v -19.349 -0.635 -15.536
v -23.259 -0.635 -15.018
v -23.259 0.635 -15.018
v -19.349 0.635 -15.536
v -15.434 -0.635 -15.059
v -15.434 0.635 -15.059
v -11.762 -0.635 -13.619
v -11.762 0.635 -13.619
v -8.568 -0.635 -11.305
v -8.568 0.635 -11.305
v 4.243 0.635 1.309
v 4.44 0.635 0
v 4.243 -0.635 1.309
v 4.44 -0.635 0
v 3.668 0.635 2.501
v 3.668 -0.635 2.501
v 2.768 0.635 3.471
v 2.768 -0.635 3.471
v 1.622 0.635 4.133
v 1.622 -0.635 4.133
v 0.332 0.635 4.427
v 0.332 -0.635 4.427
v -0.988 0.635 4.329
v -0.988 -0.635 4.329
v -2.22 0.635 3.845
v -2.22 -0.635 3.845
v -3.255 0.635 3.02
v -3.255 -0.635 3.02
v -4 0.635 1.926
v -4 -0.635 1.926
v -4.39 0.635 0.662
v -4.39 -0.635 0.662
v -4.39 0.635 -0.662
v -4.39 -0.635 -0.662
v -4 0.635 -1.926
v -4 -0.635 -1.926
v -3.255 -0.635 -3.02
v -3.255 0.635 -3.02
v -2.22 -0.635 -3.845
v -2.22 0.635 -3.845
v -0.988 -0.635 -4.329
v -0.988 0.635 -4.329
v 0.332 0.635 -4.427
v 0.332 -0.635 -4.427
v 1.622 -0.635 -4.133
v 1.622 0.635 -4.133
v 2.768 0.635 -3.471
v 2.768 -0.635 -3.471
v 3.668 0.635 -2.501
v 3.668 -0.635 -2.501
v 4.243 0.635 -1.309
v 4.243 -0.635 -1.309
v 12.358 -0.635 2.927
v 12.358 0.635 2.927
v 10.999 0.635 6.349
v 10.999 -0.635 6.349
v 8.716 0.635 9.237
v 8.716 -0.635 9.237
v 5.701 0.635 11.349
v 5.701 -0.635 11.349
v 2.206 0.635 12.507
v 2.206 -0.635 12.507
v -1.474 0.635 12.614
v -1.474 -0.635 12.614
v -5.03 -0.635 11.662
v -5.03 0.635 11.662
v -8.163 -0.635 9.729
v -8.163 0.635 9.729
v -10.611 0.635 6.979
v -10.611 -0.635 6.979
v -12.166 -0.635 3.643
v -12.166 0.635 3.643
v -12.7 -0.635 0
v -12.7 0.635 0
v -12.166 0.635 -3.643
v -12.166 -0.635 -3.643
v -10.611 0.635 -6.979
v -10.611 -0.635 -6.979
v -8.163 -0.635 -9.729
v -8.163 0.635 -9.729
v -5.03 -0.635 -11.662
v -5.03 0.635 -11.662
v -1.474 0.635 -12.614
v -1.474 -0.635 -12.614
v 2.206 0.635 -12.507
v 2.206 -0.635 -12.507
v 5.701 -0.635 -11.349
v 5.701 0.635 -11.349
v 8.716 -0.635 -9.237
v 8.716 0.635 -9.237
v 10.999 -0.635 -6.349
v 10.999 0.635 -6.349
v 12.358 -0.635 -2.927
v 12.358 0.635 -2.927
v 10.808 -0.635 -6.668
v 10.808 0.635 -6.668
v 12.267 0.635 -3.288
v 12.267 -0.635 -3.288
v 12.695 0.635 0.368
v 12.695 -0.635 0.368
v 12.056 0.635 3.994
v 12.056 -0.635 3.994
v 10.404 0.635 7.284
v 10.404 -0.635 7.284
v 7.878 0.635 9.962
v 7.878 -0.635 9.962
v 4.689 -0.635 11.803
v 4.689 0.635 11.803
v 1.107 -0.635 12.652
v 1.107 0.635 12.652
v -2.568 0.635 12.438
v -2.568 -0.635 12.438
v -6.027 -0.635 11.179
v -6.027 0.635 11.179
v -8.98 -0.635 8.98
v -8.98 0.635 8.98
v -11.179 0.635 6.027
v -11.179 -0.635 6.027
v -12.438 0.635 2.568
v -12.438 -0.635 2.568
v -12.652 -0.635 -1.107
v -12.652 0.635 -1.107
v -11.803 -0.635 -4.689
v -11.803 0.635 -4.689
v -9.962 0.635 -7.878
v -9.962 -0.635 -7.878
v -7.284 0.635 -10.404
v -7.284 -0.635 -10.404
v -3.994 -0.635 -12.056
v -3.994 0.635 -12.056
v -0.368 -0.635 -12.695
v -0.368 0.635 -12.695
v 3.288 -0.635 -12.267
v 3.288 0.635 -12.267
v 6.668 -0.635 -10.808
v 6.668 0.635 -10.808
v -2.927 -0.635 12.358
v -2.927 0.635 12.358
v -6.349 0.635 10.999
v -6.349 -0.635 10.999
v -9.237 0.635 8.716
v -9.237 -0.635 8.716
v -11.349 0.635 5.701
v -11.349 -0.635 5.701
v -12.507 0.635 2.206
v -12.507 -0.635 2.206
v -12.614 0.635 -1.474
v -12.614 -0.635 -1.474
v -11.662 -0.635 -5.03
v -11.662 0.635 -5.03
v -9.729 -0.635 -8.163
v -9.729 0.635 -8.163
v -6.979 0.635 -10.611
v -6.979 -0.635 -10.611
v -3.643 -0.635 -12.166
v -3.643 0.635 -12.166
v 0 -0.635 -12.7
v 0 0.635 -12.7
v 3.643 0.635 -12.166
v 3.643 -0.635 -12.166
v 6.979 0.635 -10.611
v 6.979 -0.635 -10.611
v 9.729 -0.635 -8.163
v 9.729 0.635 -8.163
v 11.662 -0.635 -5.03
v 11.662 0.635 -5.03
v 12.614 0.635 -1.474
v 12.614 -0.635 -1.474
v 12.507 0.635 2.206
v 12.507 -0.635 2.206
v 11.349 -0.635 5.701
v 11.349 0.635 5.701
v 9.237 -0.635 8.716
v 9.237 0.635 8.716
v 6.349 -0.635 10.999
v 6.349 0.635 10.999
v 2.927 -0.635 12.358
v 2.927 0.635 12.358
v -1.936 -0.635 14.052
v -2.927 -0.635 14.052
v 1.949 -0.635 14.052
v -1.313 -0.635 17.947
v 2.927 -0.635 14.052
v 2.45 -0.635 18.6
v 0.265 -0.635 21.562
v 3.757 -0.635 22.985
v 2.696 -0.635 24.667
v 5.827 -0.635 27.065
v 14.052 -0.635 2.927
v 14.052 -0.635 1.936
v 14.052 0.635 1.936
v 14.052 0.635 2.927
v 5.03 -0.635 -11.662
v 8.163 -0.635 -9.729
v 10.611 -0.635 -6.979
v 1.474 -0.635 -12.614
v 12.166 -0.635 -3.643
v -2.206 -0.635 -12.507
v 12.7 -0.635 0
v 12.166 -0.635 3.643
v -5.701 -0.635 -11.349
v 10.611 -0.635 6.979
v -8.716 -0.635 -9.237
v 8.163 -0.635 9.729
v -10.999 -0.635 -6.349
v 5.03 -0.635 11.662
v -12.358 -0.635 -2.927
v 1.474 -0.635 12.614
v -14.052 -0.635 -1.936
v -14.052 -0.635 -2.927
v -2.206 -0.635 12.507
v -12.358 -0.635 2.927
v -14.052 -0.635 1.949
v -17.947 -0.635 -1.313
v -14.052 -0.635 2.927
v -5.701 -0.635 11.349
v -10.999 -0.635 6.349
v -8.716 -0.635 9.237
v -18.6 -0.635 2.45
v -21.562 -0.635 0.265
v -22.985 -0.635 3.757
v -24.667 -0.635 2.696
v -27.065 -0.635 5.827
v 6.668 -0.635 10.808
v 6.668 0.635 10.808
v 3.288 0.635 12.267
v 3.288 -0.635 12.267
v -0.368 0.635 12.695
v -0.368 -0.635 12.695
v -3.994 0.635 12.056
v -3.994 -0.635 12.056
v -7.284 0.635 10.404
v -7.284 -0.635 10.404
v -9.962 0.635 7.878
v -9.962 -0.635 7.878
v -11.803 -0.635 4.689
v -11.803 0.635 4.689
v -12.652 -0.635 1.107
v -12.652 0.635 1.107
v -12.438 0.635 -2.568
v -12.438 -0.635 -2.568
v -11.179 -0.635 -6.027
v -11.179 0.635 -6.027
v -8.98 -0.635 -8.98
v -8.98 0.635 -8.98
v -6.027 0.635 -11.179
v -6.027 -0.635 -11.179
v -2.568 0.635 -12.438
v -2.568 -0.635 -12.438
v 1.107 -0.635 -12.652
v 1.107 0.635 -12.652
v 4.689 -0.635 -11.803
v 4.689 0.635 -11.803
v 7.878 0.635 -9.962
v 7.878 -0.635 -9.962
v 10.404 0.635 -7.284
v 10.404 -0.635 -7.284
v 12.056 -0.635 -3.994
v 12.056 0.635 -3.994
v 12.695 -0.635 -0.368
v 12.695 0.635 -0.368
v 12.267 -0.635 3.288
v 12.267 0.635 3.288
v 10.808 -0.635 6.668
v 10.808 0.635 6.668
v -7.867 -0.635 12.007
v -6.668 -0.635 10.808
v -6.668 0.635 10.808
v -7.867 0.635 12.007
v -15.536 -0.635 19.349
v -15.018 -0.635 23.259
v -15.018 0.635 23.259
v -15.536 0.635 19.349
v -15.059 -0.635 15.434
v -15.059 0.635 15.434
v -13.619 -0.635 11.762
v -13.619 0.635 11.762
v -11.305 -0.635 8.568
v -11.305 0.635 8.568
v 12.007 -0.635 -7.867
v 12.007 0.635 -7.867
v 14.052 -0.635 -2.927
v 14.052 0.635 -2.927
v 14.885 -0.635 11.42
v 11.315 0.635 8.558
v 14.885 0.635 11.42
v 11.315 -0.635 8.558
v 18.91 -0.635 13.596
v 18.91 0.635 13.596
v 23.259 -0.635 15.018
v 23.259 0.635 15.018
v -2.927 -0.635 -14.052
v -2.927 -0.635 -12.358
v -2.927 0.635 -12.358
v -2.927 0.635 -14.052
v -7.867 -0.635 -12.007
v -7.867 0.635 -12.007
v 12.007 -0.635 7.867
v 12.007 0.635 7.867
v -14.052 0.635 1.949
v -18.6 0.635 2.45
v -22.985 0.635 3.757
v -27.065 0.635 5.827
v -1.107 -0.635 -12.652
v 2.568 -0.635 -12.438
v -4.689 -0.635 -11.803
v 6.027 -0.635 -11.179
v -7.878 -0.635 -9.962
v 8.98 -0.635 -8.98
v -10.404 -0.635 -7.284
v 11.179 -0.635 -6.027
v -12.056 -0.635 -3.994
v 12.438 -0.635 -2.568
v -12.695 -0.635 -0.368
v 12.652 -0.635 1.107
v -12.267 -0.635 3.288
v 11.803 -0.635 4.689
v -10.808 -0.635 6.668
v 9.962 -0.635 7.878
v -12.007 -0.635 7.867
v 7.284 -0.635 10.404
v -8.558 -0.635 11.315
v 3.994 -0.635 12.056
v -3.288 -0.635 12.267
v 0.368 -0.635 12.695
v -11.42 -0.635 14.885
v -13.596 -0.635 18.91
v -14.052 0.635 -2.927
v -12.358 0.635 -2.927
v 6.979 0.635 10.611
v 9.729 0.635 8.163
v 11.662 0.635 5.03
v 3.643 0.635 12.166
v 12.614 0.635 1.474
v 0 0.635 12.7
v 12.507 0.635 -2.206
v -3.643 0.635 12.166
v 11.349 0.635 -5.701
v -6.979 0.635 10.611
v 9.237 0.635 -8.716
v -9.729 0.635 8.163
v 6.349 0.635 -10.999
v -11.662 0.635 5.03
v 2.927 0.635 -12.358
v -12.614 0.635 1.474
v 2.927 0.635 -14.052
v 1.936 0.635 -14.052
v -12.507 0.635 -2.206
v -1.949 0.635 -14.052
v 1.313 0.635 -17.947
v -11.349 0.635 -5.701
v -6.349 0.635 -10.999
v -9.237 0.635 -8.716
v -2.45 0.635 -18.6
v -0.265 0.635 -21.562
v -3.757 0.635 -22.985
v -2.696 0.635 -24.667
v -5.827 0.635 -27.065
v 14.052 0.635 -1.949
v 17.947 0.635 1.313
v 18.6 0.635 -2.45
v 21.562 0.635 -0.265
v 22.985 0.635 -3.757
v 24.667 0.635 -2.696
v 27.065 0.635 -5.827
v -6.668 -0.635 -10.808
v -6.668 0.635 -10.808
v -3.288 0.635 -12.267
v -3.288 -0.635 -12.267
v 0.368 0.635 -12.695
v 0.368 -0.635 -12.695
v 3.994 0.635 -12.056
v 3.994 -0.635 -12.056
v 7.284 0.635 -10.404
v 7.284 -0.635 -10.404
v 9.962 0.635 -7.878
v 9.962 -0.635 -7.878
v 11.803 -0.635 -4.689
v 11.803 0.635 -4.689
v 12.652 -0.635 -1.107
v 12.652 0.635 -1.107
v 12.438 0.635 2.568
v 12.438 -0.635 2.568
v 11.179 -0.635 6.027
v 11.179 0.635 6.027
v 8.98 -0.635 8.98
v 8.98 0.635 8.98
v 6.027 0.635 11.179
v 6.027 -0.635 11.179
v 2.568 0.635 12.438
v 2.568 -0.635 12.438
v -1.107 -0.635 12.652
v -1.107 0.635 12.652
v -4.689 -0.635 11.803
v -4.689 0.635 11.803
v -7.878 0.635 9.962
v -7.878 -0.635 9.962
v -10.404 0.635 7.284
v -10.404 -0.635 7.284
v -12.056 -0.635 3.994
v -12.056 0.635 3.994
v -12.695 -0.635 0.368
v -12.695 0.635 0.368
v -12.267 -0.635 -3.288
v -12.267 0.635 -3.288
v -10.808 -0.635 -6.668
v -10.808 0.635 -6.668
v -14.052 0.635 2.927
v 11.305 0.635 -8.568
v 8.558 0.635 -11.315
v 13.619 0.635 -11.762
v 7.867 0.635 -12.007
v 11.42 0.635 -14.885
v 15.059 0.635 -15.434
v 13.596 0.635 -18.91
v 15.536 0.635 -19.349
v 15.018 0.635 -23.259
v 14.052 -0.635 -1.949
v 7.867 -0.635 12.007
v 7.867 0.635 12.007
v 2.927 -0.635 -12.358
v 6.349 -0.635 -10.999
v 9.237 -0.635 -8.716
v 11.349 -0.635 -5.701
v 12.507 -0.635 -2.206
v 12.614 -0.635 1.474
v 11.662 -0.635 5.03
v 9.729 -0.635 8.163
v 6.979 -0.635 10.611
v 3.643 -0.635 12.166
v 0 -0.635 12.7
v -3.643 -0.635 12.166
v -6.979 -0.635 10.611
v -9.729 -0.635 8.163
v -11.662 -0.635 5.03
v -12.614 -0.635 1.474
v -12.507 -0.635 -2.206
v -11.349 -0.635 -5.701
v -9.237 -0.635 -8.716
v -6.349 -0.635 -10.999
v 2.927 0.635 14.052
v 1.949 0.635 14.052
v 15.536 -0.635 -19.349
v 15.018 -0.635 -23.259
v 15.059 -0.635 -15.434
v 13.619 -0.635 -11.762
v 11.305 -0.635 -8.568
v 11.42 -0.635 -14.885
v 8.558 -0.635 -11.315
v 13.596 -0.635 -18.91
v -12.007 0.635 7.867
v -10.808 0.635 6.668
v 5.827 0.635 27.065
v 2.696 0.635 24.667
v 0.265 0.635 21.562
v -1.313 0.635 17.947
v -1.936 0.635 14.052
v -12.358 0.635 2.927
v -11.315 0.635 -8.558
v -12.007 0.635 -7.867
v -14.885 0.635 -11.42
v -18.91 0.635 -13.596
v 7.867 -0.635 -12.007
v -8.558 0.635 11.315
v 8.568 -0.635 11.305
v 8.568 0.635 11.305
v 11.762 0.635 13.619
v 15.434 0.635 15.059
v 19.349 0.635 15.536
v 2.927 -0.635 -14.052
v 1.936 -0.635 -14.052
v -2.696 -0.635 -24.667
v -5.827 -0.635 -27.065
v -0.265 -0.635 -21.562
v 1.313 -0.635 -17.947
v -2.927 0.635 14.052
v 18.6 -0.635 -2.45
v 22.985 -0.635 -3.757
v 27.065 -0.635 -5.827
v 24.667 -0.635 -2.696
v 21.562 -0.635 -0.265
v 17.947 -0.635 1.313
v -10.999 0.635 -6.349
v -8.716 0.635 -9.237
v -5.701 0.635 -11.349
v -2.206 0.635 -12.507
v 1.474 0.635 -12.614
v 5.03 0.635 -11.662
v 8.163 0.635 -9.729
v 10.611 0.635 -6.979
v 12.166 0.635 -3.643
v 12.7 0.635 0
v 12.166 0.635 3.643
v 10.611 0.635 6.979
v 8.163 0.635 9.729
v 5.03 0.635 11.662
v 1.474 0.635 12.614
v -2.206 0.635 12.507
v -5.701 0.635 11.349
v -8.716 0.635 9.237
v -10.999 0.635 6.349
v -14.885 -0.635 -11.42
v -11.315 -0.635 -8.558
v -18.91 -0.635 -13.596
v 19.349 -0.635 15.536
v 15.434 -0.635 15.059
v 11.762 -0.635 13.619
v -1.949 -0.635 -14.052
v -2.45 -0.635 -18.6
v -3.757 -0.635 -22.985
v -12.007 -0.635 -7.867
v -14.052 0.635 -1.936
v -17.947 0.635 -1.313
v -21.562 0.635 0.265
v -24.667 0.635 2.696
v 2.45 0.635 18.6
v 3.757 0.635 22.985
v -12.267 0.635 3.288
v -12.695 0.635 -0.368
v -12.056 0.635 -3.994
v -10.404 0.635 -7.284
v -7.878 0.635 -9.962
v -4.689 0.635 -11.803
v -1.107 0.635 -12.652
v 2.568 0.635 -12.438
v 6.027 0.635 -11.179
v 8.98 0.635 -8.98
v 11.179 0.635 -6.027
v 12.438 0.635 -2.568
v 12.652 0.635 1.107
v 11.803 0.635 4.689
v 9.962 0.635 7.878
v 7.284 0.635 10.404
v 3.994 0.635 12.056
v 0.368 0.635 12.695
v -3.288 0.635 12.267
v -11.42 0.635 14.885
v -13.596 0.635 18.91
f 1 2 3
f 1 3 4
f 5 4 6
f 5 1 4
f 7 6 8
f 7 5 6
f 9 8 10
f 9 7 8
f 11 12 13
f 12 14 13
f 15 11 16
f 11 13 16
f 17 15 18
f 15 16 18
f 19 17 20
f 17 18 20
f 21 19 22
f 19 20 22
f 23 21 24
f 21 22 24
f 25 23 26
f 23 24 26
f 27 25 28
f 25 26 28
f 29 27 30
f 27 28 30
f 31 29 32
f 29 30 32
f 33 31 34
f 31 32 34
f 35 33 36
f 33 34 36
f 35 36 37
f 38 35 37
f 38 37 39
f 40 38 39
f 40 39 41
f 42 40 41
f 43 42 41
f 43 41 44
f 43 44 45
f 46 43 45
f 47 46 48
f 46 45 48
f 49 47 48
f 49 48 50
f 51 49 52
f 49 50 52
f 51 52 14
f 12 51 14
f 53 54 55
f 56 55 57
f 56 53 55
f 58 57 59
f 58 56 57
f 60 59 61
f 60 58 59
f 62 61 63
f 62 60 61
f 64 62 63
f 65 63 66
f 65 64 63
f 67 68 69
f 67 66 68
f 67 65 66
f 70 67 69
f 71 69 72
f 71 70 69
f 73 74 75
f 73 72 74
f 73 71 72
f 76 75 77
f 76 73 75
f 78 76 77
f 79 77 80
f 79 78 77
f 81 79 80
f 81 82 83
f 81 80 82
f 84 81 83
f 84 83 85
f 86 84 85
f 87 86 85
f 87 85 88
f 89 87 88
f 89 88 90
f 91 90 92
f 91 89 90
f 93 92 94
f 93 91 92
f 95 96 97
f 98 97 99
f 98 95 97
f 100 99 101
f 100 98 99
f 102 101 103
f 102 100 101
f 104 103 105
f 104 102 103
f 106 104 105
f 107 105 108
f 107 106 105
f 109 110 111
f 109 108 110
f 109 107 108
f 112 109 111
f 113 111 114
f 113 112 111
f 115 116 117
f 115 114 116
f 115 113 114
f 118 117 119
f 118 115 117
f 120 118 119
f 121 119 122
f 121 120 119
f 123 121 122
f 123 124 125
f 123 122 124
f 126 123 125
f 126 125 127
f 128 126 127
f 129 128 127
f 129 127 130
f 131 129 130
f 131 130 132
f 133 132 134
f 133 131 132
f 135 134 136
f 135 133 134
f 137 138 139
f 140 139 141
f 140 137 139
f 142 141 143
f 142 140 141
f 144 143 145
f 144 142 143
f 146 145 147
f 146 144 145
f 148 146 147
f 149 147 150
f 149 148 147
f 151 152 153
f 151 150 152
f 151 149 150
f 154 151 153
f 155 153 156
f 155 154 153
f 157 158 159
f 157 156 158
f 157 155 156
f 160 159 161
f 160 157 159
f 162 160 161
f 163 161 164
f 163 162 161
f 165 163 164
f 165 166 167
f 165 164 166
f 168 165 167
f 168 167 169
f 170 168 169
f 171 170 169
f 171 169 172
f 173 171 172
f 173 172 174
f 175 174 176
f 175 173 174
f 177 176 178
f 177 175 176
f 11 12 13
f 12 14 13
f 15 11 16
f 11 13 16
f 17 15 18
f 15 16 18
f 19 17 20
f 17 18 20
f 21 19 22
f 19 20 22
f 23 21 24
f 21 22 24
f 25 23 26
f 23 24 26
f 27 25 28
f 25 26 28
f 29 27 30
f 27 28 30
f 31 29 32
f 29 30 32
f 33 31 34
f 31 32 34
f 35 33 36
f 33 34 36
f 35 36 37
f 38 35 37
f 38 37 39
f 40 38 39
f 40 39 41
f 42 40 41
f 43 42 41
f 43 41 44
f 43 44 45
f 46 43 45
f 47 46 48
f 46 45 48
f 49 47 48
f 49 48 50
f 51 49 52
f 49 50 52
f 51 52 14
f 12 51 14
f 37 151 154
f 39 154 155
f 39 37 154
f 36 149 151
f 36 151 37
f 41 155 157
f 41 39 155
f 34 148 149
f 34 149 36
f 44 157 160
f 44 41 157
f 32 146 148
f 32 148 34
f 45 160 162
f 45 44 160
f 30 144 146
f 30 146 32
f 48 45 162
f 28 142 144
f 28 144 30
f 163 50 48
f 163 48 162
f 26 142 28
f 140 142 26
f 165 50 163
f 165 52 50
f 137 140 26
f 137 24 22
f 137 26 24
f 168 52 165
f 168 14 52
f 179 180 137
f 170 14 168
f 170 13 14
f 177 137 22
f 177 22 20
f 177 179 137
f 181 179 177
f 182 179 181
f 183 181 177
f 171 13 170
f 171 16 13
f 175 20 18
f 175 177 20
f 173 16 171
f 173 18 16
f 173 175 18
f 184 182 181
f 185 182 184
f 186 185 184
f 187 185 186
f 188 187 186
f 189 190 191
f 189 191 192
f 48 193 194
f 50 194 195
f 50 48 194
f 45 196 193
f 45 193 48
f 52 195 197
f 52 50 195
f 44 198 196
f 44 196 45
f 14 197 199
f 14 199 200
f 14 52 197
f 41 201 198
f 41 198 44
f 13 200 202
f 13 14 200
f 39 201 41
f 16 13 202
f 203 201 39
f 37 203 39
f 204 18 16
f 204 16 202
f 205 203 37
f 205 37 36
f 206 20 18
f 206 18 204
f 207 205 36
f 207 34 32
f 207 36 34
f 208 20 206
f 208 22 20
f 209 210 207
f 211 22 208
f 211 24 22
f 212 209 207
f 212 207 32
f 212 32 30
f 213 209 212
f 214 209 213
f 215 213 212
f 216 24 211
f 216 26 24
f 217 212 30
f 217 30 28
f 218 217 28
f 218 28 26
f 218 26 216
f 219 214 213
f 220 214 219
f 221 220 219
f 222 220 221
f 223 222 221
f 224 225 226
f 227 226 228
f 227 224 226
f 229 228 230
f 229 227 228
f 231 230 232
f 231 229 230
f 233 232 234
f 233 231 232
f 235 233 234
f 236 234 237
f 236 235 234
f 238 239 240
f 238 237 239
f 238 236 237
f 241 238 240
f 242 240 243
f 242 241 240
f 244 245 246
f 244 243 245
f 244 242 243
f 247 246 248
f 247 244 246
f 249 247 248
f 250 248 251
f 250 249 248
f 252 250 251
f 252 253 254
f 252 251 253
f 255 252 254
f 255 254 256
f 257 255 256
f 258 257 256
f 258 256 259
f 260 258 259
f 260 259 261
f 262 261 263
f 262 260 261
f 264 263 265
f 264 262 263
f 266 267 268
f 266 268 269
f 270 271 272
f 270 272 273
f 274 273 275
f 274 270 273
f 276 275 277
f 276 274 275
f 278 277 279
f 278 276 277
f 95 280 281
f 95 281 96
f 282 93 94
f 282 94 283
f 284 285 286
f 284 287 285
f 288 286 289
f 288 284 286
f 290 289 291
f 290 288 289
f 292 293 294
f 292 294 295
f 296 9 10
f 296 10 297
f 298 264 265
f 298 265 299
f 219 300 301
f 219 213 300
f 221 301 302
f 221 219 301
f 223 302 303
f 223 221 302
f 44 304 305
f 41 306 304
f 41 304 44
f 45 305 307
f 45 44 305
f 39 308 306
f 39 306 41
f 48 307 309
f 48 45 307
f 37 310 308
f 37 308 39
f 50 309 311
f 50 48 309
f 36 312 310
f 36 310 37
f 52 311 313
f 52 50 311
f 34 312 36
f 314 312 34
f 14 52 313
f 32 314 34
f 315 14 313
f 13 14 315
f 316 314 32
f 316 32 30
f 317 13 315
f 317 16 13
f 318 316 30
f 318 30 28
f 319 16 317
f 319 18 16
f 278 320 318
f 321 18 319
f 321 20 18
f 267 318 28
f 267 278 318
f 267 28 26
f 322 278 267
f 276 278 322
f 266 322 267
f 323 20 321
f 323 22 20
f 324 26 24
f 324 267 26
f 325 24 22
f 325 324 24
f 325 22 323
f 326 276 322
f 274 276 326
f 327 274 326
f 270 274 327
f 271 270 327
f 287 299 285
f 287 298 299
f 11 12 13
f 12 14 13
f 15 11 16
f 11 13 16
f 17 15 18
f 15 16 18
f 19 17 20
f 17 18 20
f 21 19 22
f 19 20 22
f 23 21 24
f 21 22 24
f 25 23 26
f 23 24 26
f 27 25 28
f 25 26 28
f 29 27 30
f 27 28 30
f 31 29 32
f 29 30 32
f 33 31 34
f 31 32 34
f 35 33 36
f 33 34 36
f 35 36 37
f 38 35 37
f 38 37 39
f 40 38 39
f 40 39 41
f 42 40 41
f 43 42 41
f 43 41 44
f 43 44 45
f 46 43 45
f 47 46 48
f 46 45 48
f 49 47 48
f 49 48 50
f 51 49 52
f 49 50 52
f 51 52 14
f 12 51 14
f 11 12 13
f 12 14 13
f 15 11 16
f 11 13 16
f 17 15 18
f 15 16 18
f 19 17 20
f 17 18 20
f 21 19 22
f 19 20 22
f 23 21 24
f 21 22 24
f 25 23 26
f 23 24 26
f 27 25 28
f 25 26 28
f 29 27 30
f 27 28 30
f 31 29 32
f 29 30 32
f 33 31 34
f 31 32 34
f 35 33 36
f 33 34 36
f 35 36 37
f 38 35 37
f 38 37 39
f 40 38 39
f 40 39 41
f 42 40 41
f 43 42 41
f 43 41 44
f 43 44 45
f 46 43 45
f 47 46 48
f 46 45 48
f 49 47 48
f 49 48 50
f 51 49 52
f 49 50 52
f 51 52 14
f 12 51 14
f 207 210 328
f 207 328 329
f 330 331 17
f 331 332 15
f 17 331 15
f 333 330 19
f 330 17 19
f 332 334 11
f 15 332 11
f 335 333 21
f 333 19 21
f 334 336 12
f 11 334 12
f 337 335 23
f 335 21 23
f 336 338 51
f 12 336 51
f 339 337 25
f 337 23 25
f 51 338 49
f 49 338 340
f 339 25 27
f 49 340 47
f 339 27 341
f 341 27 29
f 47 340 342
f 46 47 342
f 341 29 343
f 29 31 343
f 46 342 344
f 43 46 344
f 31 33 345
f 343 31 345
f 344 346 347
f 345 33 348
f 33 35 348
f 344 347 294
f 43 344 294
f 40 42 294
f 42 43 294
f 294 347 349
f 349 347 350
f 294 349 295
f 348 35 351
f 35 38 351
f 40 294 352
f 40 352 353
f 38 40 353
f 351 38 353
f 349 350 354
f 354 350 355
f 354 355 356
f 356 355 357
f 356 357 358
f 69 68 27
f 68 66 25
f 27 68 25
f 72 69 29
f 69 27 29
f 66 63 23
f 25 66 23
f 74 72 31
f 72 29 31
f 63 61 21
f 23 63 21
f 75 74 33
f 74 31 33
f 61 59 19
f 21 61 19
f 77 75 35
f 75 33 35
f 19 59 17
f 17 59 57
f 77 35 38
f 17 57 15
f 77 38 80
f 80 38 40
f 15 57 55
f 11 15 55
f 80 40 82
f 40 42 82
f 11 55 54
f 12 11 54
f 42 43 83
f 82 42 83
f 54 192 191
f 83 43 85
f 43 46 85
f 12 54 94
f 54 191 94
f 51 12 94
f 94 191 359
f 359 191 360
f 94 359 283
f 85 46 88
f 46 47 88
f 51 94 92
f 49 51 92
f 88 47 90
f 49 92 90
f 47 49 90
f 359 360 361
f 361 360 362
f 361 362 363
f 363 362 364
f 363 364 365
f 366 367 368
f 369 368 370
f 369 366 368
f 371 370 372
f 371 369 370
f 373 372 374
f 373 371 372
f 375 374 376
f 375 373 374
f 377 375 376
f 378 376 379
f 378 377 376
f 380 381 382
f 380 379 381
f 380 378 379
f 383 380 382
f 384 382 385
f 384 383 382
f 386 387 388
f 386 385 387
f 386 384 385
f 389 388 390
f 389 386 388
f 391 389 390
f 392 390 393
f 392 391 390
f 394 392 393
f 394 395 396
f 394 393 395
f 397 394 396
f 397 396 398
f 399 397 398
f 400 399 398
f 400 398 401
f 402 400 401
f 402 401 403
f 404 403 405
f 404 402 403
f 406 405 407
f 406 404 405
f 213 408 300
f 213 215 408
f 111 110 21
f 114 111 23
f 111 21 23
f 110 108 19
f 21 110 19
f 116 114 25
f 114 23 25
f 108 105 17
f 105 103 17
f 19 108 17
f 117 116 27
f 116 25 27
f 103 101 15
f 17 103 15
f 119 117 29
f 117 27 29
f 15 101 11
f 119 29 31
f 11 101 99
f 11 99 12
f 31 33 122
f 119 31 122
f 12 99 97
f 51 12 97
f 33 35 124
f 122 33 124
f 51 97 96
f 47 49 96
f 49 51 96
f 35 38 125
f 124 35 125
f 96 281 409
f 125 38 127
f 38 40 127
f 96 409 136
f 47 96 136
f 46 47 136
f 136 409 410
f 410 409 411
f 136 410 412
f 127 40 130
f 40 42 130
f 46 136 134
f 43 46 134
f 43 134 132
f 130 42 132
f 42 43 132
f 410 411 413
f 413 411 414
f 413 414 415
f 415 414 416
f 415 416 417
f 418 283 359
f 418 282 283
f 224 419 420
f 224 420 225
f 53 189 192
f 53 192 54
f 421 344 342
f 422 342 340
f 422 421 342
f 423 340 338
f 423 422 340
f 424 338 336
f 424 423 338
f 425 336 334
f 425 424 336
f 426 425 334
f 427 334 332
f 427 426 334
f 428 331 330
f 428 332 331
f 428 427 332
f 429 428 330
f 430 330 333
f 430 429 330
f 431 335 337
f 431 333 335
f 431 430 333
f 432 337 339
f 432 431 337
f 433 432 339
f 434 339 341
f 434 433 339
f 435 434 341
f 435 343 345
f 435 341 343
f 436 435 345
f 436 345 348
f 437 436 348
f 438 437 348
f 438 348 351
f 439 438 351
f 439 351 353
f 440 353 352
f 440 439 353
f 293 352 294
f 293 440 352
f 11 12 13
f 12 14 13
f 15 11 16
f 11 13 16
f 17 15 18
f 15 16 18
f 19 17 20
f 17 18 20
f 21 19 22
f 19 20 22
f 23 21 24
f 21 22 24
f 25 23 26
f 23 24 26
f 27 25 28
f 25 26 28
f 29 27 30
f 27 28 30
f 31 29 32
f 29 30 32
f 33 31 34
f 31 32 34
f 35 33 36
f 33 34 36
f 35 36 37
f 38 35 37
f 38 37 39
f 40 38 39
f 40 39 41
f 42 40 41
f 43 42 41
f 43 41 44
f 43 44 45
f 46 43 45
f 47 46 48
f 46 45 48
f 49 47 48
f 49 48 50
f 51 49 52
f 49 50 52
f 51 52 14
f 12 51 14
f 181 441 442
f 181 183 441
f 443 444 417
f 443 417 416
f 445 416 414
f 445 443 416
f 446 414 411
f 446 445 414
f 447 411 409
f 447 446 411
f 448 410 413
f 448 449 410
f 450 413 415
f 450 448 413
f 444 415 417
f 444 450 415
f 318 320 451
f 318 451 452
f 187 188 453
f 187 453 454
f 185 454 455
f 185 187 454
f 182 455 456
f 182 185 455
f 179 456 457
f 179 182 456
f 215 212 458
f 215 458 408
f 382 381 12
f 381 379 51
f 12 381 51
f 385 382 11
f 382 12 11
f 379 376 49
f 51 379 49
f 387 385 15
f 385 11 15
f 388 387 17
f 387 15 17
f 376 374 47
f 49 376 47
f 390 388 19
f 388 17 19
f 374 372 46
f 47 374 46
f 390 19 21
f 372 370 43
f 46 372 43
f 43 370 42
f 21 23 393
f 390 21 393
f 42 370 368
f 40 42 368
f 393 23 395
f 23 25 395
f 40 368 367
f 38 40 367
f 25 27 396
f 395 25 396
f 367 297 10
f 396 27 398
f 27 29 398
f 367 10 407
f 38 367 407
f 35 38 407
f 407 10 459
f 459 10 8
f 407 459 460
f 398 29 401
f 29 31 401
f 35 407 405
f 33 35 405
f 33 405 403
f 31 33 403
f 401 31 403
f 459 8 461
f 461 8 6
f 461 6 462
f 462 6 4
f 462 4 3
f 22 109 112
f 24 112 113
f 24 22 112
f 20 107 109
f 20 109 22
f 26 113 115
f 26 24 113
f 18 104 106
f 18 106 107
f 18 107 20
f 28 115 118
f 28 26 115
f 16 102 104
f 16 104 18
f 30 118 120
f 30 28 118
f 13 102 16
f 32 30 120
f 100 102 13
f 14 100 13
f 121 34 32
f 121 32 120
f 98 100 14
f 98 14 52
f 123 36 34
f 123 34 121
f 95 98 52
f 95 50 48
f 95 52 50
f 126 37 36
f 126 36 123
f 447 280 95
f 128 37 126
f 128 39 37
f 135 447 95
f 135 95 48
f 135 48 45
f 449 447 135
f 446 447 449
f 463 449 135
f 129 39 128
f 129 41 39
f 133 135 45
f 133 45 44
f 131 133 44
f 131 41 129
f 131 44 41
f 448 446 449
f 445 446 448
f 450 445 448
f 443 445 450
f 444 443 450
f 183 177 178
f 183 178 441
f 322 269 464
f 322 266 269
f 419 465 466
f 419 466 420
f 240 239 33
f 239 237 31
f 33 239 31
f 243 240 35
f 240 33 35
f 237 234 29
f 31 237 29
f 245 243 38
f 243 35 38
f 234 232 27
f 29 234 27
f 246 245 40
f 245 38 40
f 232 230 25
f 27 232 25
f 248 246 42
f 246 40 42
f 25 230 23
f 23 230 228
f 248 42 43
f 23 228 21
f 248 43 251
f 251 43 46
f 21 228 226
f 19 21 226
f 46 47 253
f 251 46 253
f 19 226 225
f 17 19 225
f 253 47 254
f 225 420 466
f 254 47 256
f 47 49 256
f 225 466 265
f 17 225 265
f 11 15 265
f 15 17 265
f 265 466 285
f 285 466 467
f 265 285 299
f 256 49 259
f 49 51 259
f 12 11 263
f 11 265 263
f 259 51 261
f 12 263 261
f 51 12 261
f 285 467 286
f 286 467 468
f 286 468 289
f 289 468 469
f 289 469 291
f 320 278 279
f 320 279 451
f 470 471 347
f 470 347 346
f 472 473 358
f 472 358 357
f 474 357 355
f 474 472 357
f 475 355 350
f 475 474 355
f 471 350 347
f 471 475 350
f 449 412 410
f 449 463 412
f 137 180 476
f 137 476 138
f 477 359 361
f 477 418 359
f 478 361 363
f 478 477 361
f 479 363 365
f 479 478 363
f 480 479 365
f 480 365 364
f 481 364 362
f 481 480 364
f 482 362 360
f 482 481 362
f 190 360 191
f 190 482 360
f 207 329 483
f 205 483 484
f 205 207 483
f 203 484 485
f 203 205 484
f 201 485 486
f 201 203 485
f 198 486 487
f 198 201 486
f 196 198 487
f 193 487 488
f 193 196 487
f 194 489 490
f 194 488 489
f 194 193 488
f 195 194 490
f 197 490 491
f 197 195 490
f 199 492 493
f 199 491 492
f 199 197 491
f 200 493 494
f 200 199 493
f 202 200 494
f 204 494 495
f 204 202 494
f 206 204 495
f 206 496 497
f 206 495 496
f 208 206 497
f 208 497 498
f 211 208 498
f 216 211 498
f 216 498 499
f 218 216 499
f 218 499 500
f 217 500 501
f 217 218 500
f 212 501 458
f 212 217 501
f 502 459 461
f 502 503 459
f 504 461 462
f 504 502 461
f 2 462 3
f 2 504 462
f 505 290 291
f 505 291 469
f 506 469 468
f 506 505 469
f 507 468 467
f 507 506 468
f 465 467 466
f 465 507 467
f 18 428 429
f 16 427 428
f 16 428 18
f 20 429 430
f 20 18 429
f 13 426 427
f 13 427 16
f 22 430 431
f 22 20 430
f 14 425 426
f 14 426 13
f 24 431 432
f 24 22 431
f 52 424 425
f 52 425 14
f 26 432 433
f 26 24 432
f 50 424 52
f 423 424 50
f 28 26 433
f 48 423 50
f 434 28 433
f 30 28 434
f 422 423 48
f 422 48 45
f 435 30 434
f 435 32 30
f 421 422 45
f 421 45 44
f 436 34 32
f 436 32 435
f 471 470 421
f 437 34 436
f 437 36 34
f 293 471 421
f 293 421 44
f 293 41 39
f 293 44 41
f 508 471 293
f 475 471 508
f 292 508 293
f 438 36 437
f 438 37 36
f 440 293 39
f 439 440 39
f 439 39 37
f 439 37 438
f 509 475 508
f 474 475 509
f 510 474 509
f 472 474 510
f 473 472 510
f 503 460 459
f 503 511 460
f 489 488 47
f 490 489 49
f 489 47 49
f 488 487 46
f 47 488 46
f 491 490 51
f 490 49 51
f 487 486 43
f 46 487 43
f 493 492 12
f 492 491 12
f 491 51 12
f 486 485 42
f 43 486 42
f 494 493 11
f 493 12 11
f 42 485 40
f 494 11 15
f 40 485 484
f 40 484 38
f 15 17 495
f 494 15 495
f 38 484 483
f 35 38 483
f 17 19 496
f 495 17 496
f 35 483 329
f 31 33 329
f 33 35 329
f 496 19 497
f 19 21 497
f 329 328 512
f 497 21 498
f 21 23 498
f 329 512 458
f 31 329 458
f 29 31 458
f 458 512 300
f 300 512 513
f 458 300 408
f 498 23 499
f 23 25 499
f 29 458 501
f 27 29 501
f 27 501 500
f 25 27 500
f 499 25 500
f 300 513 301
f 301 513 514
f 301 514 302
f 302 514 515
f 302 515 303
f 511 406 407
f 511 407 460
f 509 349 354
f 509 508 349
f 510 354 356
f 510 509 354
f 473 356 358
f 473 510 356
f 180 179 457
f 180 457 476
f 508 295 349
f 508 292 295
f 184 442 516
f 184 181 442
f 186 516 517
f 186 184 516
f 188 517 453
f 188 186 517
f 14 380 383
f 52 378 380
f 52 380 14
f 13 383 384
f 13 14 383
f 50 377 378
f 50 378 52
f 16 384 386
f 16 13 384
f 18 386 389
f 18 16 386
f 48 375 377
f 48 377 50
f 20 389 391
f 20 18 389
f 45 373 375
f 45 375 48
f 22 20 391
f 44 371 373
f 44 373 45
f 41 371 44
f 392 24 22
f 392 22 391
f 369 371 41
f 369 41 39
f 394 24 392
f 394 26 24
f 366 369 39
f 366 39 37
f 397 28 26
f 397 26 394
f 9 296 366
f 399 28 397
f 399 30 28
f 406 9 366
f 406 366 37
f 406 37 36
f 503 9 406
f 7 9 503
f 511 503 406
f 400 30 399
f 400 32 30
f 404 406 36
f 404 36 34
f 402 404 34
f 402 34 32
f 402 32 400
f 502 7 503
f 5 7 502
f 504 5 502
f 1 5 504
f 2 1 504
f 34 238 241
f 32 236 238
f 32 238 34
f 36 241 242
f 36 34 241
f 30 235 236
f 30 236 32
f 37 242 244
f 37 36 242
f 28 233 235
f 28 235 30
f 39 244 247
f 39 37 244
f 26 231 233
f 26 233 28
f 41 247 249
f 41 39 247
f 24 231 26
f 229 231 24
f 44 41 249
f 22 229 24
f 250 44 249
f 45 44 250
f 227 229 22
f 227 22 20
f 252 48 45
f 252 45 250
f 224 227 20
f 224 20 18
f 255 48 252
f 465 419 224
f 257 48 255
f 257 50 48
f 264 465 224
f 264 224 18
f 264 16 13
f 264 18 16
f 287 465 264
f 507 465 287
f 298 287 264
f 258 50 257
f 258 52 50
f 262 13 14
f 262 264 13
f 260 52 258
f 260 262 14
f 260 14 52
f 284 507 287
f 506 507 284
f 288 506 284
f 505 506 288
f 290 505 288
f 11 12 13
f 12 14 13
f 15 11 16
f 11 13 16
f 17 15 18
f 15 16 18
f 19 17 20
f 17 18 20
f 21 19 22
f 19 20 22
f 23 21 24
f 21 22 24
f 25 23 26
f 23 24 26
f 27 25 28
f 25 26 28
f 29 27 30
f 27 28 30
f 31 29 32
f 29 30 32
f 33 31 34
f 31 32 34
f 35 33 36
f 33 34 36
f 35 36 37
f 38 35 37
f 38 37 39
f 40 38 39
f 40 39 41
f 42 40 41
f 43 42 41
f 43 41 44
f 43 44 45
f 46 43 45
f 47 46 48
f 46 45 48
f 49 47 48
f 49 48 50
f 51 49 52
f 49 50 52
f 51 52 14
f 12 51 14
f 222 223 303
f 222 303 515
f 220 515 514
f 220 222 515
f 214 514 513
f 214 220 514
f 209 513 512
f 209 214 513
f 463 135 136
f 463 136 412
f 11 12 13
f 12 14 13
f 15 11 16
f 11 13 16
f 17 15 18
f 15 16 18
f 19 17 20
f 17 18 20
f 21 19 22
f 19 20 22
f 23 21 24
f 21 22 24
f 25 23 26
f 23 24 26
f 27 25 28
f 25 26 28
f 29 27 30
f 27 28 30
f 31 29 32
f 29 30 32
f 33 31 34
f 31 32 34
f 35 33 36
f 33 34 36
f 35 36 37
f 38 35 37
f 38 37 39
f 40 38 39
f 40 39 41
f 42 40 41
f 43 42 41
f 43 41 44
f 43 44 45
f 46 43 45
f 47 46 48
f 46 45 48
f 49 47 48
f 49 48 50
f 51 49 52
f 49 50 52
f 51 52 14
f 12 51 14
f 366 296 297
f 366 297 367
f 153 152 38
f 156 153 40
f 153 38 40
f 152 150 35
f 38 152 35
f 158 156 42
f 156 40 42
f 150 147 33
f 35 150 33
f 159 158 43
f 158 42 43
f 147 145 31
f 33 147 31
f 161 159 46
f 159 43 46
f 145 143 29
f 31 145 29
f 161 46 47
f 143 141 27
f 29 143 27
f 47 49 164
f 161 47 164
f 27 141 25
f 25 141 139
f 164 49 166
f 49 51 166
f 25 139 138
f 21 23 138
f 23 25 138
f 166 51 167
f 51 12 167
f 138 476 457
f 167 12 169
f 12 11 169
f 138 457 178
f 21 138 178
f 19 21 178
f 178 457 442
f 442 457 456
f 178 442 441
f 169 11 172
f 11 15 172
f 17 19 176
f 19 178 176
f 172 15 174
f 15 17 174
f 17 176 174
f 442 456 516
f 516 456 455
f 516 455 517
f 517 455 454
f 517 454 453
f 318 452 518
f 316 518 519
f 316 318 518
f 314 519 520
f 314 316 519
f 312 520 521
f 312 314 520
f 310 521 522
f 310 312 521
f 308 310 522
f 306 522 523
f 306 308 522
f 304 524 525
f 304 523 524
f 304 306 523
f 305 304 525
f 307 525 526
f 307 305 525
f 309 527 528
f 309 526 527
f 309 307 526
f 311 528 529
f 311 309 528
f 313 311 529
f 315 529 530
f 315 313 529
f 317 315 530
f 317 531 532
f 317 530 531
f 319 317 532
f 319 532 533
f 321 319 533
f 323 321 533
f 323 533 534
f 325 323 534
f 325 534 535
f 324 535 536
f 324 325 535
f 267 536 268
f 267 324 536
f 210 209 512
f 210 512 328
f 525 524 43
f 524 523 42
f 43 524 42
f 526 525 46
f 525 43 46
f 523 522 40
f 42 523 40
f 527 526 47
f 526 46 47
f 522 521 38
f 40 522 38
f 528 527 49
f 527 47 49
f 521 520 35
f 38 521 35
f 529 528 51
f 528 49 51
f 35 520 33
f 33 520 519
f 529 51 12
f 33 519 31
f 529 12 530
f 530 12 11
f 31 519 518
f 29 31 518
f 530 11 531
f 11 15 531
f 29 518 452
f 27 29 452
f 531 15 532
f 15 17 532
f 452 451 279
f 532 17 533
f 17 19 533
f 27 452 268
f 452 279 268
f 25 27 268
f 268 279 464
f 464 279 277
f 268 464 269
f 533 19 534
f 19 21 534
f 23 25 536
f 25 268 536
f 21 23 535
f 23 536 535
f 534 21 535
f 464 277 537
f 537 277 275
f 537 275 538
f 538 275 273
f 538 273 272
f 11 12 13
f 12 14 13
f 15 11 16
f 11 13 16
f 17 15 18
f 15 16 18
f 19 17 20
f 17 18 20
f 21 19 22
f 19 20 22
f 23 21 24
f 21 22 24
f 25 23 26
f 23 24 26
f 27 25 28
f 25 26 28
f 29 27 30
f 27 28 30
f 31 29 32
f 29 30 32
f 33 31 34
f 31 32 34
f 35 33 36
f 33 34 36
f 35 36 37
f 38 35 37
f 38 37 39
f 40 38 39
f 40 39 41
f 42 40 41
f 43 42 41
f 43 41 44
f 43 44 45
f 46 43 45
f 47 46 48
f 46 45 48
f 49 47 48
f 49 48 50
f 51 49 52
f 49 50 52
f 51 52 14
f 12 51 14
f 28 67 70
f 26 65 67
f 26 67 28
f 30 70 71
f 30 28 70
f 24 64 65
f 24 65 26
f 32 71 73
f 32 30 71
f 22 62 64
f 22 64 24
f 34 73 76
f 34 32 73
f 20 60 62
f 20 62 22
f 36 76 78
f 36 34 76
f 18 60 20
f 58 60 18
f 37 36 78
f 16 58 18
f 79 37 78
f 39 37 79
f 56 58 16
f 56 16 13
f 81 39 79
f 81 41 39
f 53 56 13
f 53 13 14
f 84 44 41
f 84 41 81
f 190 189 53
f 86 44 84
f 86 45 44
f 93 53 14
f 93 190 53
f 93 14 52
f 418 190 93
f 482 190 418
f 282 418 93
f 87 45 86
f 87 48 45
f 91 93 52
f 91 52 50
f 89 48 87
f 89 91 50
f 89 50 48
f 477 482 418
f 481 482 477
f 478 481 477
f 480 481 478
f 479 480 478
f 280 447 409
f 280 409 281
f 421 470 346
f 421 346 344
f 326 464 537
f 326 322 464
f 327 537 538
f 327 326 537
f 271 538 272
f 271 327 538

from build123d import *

# Parameters (mm, degrees)
F0_R     = 12.7
F1_DEPTH = 0.635
F3_DEPTH = 0.635
F4_COUNT = 8
F5_R     = 4.439905
F6_DEPTH = 0.635


with BuildPart() as f1:
    # F0 (on Front) → F1 (new body, symmetric)
    with BuildSketch(Plane.XZ):
        Circle(F0_R)
    extrude(amount=F1_DEPTH, both=True)

    # F2 (on Front) → F3 (join, symmetric)
    with BuildSketch(Plane.XZ):
        with BuildLine():
            ThreePointArc((1.949066, 14.05243), (3.004953, 20.822175), (5.827283, 27.065475))
            ThreePointArc((5.827283, 27.065475), (0.264713, 21.561766), (-1.935937, 14.05243))
            Line((-1.935937, 14.05243), (1.949066, 14.05243))
        make_face()
        Polygon((1.949066, 14.05243), (-1.935937, 14.05243), (-2.927434, 14.05243), (-2.927434, 10.705924), (2.927434, 10.705924), (2.927434, 14.05243), align=None)
    extrude(amount=F3_DEPTH, both=True)


with BuildPart() as f4_1:
    # F4: instance of F1
    add(f1.part.rotate(Axis((0, -0.635, 0), (0, 1, 0)), 1 * 360 / F4_COUNT))


with BuildPart() as f4_2:
    # F4: instance of F1
    add(f1.part.rotate(Axis((0, -0.635, 0), (0, 1, 0)), 2 * 360 / F4_COUNT))


with BuildPart() as f4_3:
    # F4: instance of F1
    add(f1.part.rotate(Axis((0, -0.635, 0), (0, 1, 0)), 3 * 360 / F4_COUNT))


with BuildPart() as f4_4:
    # F4: instance of F1
    add(f1.part.rotate(Axis((0, -0.635, 0), (0, 1, 0)), 4 * 360 / F4_COUNT))


with BuildPart() as f4_5:
    # F4: instance of F1
    add(f1.part.rotate(Axis((0, -0.635, 0), (0, 1, 0)), 5 * 360 / F4_COUNT))


with BuildPart() as f4_6:
    # F4: instance of F1
    add(f1.part.rotate(Axis((0, -0.635, 0), (0, 1, 0)), 6 * 360 / F4_COUNT))


with BuildPart() as f4_7:
    # F4: instance of F1
    add(f1.part.rotate(Axis((0, -0.635, 0), (0, 1, 0)), 7 * 360 / F4_COUNT))


with BuildPart() as f6_tool:
    # F5 (on Front) → F6 (new body, symmetric)
    with BuildSketch(Plane.XZ):
        Circle(F5_R)
    extrude(amount=F6_DEPTH, both=True)


with BuildPart() as f1_1:
    add(f1.part)

    # F6: cut by f6_tool
    add(f6_tool.part, mode=Mode.SUBTRACT)


with BuildPart() as f4_1_1:
    add(f4_1.part)

    # F6: cut by f6_tool
    add(f6_tool.part, mode=Mode.SUBTRACT)


with BuildPart() as f4_2_1:
    add(f4_2.part)

    # F6: cut by f6_tool
    add(f6_tool.part, mode=Mode.SUBTRACT)


with BuildPart() as f4_3_1:
    add(f4_3.part)

    # F6: cut by f6_tool
    add(f6_tool.part, mode=Mode.SUBTRACT)


with BuildPart() as f4_4_1:
    add(f4_4.part)

    # F6: cut by f6_tool
    add(f6_tool.part, mode=Mode.SUBTRACT)


with BuildPart() as f4_5_1:
    add(f4_5.part)

    # F6: cut by f6_tool
    add(f6_tool.part, mode=Mode.SUBTRACT)


with BuildPart() as f4_6_1:
    add(f4_6.part)

    # F6: cut by f6_tool
    add(f6_tool.part, mode=Mode.SUBTRACT)


with BuildPart() as f4_7_1:
    add(f4_7.part)

    # F6: cut by f6_tool
    add(f6_tool.part, mode=Mode.SUBTRACT)


solid = Compound([f1_1.part, f4_1_1.part, f4_2_1.part, f4_3_1.part, f4_4_1.part, f4_5_1.part, f4_6_1.part, f4_7_1.part])
